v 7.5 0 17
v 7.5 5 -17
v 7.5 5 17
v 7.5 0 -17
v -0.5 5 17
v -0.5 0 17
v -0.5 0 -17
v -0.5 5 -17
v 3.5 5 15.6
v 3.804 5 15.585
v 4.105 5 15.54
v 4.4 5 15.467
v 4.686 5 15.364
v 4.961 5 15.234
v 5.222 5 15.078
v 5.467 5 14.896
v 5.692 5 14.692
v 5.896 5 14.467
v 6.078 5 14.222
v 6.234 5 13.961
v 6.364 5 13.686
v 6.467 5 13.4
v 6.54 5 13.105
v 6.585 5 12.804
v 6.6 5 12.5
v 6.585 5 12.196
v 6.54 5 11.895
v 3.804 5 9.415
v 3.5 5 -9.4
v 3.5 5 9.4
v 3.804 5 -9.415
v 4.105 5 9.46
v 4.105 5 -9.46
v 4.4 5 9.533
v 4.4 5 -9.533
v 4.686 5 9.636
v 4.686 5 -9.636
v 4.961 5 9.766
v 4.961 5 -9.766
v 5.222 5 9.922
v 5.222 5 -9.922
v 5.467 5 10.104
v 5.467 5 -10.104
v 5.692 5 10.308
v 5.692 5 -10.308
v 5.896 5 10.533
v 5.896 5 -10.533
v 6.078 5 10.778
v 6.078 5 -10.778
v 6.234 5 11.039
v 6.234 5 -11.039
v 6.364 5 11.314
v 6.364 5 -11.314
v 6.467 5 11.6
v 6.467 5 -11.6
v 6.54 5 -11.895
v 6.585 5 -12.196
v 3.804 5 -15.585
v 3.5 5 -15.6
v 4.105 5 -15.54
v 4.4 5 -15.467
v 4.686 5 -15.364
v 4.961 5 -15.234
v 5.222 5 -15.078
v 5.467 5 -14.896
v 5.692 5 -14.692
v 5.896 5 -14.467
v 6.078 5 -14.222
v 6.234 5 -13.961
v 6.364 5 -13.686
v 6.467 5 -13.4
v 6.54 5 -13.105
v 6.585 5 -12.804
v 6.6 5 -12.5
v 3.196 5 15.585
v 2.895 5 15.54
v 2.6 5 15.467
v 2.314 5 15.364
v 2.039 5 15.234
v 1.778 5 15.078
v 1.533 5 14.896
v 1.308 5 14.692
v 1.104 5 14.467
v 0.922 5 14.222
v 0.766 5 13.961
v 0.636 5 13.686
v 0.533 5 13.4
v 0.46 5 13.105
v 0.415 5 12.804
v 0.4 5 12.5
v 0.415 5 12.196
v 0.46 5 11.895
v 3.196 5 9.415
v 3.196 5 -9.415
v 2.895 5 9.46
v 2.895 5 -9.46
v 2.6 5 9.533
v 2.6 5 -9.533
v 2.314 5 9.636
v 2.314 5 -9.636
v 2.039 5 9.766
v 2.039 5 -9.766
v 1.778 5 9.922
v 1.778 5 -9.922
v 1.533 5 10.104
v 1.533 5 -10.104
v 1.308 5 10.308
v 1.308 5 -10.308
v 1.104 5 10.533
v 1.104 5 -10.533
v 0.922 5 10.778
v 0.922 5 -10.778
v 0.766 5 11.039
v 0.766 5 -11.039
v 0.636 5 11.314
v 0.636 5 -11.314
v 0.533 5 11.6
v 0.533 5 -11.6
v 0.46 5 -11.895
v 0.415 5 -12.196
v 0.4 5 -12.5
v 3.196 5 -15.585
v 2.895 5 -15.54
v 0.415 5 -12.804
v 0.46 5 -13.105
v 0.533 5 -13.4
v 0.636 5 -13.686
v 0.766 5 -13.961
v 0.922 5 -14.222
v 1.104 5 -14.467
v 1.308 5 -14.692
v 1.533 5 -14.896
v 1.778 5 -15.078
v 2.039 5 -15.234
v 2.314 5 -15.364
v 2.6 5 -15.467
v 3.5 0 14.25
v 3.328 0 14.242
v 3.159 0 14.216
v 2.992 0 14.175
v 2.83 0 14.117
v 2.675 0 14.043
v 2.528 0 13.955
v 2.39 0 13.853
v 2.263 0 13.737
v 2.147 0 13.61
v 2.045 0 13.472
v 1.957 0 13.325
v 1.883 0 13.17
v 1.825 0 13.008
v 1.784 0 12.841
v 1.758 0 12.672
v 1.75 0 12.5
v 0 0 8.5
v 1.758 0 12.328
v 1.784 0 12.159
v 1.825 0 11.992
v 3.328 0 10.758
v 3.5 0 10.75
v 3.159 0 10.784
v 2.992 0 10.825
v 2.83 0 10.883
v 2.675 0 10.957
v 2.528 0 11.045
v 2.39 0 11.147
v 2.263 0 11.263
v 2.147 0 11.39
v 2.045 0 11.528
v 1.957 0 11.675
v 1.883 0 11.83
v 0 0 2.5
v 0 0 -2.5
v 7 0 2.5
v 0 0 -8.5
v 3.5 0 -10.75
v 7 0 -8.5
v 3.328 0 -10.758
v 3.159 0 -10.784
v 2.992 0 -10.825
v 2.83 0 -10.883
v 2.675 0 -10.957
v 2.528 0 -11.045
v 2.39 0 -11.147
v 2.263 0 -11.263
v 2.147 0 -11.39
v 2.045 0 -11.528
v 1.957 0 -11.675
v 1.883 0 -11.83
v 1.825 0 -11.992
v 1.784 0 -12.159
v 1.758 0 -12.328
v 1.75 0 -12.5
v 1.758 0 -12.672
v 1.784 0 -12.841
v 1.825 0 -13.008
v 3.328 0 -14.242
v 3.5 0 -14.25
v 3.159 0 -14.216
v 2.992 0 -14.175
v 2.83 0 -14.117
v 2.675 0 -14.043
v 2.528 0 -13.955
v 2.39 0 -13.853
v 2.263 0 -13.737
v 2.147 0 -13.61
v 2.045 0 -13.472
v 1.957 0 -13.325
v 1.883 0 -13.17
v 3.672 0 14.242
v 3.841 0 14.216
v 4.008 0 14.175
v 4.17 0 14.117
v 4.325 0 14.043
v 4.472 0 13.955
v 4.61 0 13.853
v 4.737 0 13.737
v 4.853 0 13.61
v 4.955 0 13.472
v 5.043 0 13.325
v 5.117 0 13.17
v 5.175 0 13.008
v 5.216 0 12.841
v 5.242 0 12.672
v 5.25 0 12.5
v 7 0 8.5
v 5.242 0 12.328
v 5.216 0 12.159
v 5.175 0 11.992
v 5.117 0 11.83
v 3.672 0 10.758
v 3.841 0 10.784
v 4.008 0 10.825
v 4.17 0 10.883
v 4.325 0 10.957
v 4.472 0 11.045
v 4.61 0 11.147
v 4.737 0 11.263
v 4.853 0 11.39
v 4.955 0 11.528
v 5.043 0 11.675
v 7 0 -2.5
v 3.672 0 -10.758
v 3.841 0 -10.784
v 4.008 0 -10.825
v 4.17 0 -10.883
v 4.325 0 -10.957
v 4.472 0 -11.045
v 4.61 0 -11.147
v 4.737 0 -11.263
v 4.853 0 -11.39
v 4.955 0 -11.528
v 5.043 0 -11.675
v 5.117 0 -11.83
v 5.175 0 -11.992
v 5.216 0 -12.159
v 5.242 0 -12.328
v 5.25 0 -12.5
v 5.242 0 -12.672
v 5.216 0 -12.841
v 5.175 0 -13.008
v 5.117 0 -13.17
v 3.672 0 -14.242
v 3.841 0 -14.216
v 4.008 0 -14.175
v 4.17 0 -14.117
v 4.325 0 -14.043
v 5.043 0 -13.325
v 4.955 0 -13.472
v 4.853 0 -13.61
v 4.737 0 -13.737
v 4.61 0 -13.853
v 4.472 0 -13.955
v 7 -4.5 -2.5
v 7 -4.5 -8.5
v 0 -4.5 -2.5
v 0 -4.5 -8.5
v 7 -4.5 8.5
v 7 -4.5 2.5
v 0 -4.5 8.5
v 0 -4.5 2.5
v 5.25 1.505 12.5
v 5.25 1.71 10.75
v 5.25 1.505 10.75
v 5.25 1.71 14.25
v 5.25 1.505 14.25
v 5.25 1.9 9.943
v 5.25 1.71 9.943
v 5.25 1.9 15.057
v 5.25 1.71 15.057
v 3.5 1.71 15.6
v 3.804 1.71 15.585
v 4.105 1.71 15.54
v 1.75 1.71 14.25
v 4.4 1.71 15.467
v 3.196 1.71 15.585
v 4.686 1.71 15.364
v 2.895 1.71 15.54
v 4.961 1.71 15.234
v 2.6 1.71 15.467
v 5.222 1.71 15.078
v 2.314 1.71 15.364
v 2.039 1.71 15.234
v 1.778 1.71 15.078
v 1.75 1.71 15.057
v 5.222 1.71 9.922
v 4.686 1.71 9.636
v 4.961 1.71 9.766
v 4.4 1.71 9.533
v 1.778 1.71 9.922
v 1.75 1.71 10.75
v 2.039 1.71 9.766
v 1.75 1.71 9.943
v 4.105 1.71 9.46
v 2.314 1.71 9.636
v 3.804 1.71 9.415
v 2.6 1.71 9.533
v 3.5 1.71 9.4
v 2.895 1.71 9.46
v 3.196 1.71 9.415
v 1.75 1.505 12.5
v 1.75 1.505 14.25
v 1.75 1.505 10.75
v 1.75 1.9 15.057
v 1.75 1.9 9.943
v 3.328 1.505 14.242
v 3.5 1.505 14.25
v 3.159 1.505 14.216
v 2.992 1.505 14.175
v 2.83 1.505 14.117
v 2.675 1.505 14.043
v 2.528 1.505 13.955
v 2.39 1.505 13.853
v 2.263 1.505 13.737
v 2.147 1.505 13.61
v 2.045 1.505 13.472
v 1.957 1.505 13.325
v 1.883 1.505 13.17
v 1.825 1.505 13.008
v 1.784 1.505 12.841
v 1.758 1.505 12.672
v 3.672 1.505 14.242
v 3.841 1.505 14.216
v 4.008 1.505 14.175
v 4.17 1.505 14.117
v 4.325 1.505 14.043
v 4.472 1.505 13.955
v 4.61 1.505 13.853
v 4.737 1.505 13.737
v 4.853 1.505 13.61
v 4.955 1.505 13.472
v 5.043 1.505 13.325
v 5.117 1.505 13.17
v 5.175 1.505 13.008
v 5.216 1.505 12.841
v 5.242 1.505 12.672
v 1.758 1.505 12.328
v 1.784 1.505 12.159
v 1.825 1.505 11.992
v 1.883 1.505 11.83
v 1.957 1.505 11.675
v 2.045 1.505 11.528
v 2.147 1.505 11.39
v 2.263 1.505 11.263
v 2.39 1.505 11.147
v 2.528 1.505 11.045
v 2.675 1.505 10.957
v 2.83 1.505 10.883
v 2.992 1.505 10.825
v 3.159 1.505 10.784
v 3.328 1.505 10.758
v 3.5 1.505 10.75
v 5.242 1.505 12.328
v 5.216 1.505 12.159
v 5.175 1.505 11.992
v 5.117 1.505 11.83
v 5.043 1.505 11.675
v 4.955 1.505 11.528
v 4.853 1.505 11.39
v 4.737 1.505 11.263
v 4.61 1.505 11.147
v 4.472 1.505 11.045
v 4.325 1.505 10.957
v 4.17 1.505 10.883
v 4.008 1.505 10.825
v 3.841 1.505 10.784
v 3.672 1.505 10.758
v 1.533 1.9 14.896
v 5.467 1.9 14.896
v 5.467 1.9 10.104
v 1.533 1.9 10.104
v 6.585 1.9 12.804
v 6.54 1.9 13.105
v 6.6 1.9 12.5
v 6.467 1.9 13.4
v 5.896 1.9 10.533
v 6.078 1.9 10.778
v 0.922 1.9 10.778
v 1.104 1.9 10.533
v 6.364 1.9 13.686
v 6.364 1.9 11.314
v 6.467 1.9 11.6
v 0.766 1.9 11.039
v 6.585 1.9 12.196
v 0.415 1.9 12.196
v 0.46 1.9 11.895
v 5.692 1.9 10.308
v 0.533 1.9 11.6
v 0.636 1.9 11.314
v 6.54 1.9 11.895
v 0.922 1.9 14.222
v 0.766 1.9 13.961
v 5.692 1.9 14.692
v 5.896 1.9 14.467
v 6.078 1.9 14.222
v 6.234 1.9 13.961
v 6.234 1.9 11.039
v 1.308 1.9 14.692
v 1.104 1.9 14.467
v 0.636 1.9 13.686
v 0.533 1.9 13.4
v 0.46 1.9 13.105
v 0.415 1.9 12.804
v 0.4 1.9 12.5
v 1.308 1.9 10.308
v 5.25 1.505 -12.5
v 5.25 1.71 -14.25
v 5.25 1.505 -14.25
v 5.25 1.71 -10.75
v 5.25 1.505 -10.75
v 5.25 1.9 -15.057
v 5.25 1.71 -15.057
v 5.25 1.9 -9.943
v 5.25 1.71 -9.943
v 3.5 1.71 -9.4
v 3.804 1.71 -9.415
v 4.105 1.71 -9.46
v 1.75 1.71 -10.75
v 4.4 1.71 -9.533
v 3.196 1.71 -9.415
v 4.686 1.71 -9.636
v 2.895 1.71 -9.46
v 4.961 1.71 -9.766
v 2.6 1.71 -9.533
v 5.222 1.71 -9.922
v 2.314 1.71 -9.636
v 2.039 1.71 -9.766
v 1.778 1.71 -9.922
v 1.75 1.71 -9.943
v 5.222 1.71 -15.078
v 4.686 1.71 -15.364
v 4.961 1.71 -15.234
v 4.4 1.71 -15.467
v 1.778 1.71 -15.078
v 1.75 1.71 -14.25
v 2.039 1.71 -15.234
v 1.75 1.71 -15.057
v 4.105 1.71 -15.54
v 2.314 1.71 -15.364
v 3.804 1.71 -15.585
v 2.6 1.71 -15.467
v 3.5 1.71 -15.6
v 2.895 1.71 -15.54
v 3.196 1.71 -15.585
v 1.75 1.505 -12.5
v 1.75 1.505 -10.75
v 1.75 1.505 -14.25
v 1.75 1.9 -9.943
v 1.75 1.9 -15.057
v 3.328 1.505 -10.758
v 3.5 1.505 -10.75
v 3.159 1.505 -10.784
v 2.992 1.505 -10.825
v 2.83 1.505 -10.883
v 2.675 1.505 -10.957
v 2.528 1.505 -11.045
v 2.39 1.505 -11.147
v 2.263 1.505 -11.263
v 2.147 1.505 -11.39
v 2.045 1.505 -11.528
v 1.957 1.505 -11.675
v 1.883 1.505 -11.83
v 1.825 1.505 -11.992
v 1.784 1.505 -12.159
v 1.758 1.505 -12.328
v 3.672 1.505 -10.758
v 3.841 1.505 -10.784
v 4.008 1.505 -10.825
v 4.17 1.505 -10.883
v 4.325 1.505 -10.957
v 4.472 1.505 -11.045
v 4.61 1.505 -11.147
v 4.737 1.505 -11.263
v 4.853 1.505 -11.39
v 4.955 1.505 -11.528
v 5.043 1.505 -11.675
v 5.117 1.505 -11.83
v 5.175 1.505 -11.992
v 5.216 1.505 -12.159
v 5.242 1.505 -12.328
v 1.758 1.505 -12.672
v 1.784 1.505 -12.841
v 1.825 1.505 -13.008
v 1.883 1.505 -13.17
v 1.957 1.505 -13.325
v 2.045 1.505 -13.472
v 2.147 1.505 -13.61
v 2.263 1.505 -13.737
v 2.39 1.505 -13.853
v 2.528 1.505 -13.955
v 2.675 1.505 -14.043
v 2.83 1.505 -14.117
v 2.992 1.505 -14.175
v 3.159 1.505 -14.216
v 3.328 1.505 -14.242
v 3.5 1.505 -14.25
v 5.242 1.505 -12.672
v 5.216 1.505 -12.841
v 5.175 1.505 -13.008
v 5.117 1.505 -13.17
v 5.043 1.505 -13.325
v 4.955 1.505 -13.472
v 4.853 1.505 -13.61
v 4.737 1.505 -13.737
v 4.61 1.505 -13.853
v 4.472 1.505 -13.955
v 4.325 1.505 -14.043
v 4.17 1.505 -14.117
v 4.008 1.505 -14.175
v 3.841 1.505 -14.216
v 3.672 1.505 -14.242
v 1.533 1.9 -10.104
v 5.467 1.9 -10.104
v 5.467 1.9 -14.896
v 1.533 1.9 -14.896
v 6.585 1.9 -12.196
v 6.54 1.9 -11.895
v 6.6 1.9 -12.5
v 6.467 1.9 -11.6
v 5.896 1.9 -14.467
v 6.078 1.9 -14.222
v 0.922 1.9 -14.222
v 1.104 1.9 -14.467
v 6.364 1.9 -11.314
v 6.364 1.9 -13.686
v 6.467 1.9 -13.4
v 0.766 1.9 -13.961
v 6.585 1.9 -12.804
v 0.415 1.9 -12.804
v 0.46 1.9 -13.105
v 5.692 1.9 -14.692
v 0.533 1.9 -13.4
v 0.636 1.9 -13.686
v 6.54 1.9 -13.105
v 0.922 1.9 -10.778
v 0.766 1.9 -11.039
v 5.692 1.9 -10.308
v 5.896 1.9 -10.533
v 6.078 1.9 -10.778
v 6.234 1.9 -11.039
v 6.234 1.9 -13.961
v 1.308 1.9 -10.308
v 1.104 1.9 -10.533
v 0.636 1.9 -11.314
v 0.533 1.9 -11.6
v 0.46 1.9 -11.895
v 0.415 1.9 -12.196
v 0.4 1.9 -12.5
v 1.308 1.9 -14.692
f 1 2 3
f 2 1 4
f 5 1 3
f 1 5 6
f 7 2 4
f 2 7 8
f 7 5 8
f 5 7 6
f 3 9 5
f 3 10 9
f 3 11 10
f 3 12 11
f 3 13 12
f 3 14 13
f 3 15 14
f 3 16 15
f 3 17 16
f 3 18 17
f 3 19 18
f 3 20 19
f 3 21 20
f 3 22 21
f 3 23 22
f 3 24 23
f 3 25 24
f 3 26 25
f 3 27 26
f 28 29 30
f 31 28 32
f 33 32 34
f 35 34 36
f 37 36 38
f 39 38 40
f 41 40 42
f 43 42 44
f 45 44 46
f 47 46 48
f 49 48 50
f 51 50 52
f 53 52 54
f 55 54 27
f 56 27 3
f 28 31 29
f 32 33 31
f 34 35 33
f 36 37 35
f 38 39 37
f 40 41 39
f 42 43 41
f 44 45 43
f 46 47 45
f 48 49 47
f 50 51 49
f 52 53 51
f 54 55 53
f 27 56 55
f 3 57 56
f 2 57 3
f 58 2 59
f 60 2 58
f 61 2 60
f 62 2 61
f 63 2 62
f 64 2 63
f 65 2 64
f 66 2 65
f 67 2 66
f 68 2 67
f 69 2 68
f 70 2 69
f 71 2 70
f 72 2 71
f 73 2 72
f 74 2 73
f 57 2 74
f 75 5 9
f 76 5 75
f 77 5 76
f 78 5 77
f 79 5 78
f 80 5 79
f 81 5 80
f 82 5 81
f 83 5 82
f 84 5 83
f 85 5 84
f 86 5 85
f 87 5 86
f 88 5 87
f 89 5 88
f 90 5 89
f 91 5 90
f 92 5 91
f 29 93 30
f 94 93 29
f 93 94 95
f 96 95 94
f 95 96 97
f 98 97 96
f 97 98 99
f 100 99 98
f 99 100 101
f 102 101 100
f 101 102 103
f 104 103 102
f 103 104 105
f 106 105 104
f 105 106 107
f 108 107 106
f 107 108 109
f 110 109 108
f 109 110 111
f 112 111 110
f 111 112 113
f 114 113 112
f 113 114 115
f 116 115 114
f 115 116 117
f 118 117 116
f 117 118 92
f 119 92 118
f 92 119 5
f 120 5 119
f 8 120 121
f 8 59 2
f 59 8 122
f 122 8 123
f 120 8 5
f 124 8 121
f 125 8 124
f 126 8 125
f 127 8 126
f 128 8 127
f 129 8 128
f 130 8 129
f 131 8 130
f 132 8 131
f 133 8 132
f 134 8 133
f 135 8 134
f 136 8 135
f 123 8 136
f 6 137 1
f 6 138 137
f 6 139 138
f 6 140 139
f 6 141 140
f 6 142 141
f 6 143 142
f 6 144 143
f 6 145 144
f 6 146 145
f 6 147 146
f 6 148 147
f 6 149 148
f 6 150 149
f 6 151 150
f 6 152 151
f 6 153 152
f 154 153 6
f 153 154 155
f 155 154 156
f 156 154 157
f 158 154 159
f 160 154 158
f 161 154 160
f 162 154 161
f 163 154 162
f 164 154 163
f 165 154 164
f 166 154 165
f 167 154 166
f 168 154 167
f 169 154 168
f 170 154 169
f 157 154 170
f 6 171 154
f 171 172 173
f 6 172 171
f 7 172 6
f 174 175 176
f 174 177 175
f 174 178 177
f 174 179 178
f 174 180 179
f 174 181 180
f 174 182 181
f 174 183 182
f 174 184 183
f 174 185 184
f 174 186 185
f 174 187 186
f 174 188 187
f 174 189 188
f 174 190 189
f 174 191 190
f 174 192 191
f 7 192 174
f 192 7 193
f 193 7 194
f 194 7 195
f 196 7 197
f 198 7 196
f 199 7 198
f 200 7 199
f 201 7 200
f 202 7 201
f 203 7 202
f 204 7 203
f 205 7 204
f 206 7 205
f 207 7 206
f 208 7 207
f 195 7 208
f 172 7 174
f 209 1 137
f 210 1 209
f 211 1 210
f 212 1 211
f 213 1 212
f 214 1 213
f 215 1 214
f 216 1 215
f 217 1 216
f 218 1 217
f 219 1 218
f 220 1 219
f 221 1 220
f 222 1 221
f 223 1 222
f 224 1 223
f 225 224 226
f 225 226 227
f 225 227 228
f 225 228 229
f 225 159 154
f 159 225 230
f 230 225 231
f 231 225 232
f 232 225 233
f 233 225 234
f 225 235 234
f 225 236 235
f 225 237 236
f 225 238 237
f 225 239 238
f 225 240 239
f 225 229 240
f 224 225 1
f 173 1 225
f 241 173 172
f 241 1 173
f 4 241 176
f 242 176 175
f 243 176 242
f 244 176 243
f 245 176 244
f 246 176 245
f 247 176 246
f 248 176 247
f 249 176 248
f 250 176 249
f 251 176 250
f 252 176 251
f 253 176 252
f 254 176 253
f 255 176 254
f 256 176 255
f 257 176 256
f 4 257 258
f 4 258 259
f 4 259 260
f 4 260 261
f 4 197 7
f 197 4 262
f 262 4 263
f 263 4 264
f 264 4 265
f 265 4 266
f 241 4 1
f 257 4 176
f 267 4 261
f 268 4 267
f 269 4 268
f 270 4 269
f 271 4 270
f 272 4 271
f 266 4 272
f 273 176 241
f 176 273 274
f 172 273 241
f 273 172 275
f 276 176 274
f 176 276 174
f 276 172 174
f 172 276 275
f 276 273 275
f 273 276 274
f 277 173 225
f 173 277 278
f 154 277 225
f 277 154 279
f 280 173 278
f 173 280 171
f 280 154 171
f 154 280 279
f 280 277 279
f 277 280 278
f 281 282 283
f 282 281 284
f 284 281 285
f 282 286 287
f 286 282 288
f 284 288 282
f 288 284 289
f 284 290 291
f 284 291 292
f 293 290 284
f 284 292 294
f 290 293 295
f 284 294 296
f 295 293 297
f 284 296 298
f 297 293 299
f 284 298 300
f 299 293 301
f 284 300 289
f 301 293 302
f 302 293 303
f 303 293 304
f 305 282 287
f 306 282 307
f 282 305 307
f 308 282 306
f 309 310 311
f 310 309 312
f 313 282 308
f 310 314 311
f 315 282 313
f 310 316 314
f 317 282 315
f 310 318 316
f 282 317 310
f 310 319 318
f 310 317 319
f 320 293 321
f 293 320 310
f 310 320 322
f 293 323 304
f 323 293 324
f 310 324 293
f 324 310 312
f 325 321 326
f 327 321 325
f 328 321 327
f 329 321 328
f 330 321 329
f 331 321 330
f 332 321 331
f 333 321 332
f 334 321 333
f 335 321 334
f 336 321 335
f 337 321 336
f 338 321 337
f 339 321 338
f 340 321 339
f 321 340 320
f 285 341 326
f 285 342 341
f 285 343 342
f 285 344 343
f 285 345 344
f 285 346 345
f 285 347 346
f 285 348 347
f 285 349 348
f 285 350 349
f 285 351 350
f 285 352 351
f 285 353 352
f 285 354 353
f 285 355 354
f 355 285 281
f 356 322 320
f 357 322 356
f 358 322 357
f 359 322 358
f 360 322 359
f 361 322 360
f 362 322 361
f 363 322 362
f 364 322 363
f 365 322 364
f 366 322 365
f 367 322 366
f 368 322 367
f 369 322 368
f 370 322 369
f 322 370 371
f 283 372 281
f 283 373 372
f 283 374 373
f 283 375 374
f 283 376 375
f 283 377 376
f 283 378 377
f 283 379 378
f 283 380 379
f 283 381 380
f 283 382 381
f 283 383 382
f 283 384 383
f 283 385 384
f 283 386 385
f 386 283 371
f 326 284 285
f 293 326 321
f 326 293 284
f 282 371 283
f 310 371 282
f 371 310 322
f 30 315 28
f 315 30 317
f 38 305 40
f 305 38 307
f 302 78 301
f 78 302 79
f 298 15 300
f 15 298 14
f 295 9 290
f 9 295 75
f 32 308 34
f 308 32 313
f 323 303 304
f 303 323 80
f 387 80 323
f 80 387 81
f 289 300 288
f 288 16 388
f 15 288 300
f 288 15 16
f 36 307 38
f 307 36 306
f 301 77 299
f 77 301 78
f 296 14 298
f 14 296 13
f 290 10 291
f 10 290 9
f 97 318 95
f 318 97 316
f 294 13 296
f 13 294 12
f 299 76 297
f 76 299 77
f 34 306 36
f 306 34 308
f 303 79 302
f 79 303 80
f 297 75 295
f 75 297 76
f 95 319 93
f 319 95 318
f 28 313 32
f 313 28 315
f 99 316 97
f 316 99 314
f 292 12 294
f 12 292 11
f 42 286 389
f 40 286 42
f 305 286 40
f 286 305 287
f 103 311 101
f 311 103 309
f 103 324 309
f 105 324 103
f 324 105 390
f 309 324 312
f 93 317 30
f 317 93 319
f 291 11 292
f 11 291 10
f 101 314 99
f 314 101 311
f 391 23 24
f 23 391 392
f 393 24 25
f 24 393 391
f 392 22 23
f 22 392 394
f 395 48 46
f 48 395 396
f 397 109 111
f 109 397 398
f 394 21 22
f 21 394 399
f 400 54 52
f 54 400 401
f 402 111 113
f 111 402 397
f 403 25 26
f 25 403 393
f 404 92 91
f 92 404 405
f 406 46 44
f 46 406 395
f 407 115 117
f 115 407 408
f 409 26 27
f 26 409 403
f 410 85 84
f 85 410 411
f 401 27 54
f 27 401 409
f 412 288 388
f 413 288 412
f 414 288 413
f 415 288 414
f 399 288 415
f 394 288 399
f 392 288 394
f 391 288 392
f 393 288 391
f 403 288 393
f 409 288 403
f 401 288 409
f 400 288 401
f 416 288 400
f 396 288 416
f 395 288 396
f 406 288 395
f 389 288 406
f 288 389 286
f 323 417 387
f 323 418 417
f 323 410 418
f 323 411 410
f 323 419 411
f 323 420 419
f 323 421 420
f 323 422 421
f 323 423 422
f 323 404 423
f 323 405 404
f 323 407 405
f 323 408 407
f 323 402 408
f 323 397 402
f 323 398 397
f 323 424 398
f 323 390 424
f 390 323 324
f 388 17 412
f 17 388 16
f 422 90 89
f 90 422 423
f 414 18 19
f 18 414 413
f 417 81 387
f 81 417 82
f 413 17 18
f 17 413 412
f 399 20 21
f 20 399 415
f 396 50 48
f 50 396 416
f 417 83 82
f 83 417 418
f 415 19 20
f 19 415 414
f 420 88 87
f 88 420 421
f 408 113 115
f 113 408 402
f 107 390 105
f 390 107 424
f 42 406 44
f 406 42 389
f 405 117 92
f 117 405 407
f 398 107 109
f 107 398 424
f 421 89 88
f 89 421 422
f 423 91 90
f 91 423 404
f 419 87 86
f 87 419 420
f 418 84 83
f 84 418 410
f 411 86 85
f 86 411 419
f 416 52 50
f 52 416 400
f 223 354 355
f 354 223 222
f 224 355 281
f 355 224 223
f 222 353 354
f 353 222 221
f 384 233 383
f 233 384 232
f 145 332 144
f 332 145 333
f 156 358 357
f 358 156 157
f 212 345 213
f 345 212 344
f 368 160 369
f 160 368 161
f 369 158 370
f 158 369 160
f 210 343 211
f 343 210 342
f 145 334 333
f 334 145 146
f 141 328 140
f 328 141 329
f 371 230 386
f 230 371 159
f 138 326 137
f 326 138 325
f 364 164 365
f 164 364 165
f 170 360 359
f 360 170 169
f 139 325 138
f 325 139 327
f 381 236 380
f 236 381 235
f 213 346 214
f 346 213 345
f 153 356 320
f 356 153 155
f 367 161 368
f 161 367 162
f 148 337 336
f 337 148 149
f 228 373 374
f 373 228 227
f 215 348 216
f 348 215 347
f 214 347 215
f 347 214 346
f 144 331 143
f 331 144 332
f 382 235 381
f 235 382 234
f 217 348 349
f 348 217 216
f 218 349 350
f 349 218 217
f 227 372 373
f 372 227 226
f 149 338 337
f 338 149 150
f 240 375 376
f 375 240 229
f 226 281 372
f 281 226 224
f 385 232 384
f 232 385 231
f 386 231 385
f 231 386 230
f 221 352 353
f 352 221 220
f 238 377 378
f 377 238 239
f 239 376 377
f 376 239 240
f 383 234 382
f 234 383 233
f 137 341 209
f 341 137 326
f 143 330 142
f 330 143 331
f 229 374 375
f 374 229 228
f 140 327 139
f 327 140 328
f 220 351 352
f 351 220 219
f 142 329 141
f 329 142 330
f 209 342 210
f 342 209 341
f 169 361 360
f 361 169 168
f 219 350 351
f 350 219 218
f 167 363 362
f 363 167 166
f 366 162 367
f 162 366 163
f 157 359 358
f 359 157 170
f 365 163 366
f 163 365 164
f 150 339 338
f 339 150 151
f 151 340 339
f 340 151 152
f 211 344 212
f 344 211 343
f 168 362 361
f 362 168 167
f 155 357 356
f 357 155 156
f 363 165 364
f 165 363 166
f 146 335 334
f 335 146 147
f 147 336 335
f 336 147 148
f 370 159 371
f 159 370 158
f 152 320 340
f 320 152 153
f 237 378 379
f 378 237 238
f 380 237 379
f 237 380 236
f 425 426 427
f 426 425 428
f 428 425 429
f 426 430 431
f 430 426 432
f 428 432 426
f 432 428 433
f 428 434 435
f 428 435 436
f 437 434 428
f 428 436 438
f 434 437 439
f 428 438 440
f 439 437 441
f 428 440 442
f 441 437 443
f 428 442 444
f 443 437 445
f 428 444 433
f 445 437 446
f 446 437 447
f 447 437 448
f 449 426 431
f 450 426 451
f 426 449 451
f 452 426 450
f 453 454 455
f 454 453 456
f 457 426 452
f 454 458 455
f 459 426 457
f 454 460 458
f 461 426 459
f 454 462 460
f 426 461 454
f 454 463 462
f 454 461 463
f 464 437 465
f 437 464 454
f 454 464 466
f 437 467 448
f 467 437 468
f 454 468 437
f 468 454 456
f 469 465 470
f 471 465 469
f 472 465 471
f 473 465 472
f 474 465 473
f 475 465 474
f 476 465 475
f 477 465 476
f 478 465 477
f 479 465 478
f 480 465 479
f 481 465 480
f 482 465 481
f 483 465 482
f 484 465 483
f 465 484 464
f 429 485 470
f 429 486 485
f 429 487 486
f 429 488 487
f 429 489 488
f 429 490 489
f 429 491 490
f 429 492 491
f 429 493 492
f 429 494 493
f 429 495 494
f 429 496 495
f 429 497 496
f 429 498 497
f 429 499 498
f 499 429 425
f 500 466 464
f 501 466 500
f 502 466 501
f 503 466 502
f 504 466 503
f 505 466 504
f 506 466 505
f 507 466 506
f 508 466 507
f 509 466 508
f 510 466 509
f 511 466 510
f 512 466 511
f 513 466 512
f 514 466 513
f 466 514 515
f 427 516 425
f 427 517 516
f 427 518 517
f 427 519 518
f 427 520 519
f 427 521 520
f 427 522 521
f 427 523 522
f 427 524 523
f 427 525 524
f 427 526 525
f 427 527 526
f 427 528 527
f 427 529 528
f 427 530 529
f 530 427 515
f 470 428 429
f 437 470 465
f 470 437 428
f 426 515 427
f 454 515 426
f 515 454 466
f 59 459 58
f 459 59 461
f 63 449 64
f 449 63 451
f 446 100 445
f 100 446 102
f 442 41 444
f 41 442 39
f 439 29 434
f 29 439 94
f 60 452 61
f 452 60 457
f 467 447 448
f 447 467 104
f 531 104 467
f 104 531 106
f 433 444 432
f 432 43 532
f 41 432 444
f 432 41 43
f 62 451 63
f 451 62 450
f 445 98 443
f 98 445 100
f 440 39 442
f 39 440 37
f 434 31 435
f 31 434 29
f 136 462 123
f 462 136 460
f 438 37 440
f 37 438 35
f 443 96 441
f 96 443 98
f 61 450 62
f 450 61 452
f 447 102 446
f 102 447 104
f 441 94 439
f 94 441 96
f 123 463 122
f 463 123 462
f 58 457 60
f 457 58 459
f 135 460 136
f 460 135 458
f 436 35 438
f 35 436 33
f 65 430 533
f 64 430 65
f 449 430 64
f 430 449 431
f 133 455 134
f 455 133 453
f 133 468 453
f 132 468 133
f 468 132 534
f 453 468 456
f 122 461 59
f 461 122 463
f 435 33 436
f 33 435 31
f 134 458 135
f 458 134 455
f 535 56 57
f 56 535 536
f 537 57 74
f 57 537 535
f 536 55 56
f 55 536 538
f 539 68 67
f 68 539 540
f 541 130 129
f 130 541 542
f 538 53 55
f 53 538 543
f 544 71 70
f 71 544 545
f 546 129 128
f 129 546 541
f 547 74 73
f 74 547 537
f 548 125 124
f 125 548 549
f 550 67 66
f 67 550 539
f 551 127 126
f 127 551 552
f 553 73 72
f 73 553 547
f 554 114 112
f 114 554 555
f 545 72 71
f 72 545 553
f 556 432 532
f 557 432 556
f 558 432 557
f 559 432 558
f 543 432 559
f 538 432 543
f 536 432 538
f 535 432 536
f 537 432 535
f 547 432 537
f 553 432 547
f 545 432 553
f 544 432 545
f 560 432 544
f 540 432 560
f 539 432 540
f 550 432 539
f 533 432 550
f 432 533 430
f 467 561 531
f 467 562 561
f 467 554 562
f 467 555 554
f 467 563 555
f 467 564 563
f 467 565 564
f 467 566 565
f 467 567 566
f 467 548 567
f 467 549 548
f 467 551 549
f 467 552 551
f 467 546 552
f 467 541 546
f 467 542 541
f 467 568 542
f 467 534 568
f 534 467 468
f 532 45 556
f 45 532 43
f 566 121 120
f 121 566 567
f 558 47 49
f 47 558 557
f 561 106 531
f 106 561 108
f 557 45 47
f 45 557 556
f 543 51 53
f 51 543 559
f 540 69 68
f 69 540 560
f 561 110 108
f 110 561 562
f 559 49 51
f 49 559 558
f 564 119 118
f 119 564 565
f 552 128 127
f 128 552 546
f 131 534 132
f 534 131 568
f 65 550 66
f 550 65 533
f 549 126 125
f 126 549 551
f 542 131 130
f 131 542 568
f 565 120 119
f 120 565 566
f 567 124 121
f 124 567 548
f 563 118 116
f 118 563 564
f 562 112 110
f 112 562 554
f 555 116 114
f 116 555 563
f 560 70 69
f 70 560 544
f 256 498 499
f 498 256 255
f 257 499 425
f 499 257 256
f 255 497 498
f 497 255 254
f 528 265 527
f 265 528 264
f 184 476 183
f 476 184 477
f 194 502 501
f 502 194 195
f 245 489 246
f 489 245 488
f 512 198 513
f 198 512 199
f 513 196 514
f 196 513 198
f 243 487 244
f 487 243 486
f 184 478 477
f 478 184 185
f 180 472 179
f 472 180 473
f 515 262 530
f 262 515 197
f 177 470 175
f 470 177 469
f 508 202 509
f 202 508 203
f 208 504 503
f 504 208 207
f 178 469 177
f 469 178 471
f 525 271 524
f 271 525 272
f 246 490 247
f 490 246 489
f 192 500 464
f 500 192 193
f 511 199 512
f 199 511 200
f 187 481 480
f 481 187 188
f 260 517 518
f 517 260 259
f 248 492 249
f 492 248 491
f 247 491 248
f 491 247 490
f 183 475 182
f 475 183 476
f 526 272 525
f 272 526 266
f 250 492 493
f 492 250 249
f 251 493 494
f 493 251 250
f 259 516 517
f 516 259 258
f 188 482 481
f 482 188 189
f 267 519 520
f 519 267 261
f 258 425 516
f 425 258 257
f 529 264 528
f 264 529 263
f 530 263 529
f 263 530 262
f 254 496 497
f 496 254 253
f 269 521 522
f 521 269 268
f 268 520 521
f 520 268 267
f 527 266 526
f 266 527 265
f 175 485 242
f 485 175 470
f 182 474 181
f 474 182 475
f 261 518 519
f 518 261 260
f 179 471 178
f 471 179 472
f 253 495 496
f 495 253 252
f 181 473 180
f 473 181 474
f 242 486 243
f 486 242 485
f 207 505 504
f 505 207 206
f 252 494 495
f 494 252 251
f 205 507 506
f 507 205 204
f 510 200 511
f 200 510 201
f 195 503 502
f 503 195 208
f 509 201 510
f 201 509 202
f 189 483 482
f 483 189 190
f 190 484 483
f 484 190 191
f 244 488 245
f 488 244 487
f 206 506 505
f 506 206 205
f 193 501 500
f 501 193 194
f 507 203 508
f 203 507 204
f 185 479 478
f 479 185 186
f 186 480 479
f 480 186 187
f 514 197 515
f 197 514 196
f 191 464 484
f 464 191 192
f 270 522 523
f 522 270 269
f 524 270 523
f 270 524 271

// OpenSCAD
$fn=64;

module m3_mount(length=10,top_cut=0) {
   cylinder(d=6.2,h=3.2,center=false);
   cylinder(d=3.5,h=length,center=false);
   if(0 != top_cut) {
      intersection() {
         cylinder(d=6.2,h=10,center=false);
         union() {
            translate([0,0,3.2+0.09]) cube([3.5,10,0.2],true);
            translate([0,0,3.2+0.09+0.2]) cube([3.5,3.5,0.21],true);
         }
      }
   }
}

module belt_hold() {
   difference() {
      union() {
         translate([-0.5,0,-17]) cube([8,5,34],false);
         translate([0,-4.5,-8.5]) cube([7,5,6],false);
         translate([0,-4.5,2.5]) cube([7,5,6],false);
      }
      translate([3.5,3.2+1.9,12.5]) rotate([90,0,0]) m3_mount(top_cut=0.2);
      translate([3.5,3.2+1.9,-12.5]) rotate([90,0,0]) m3_mount(top_cut=0.2);
   }
}

belt_hold();
